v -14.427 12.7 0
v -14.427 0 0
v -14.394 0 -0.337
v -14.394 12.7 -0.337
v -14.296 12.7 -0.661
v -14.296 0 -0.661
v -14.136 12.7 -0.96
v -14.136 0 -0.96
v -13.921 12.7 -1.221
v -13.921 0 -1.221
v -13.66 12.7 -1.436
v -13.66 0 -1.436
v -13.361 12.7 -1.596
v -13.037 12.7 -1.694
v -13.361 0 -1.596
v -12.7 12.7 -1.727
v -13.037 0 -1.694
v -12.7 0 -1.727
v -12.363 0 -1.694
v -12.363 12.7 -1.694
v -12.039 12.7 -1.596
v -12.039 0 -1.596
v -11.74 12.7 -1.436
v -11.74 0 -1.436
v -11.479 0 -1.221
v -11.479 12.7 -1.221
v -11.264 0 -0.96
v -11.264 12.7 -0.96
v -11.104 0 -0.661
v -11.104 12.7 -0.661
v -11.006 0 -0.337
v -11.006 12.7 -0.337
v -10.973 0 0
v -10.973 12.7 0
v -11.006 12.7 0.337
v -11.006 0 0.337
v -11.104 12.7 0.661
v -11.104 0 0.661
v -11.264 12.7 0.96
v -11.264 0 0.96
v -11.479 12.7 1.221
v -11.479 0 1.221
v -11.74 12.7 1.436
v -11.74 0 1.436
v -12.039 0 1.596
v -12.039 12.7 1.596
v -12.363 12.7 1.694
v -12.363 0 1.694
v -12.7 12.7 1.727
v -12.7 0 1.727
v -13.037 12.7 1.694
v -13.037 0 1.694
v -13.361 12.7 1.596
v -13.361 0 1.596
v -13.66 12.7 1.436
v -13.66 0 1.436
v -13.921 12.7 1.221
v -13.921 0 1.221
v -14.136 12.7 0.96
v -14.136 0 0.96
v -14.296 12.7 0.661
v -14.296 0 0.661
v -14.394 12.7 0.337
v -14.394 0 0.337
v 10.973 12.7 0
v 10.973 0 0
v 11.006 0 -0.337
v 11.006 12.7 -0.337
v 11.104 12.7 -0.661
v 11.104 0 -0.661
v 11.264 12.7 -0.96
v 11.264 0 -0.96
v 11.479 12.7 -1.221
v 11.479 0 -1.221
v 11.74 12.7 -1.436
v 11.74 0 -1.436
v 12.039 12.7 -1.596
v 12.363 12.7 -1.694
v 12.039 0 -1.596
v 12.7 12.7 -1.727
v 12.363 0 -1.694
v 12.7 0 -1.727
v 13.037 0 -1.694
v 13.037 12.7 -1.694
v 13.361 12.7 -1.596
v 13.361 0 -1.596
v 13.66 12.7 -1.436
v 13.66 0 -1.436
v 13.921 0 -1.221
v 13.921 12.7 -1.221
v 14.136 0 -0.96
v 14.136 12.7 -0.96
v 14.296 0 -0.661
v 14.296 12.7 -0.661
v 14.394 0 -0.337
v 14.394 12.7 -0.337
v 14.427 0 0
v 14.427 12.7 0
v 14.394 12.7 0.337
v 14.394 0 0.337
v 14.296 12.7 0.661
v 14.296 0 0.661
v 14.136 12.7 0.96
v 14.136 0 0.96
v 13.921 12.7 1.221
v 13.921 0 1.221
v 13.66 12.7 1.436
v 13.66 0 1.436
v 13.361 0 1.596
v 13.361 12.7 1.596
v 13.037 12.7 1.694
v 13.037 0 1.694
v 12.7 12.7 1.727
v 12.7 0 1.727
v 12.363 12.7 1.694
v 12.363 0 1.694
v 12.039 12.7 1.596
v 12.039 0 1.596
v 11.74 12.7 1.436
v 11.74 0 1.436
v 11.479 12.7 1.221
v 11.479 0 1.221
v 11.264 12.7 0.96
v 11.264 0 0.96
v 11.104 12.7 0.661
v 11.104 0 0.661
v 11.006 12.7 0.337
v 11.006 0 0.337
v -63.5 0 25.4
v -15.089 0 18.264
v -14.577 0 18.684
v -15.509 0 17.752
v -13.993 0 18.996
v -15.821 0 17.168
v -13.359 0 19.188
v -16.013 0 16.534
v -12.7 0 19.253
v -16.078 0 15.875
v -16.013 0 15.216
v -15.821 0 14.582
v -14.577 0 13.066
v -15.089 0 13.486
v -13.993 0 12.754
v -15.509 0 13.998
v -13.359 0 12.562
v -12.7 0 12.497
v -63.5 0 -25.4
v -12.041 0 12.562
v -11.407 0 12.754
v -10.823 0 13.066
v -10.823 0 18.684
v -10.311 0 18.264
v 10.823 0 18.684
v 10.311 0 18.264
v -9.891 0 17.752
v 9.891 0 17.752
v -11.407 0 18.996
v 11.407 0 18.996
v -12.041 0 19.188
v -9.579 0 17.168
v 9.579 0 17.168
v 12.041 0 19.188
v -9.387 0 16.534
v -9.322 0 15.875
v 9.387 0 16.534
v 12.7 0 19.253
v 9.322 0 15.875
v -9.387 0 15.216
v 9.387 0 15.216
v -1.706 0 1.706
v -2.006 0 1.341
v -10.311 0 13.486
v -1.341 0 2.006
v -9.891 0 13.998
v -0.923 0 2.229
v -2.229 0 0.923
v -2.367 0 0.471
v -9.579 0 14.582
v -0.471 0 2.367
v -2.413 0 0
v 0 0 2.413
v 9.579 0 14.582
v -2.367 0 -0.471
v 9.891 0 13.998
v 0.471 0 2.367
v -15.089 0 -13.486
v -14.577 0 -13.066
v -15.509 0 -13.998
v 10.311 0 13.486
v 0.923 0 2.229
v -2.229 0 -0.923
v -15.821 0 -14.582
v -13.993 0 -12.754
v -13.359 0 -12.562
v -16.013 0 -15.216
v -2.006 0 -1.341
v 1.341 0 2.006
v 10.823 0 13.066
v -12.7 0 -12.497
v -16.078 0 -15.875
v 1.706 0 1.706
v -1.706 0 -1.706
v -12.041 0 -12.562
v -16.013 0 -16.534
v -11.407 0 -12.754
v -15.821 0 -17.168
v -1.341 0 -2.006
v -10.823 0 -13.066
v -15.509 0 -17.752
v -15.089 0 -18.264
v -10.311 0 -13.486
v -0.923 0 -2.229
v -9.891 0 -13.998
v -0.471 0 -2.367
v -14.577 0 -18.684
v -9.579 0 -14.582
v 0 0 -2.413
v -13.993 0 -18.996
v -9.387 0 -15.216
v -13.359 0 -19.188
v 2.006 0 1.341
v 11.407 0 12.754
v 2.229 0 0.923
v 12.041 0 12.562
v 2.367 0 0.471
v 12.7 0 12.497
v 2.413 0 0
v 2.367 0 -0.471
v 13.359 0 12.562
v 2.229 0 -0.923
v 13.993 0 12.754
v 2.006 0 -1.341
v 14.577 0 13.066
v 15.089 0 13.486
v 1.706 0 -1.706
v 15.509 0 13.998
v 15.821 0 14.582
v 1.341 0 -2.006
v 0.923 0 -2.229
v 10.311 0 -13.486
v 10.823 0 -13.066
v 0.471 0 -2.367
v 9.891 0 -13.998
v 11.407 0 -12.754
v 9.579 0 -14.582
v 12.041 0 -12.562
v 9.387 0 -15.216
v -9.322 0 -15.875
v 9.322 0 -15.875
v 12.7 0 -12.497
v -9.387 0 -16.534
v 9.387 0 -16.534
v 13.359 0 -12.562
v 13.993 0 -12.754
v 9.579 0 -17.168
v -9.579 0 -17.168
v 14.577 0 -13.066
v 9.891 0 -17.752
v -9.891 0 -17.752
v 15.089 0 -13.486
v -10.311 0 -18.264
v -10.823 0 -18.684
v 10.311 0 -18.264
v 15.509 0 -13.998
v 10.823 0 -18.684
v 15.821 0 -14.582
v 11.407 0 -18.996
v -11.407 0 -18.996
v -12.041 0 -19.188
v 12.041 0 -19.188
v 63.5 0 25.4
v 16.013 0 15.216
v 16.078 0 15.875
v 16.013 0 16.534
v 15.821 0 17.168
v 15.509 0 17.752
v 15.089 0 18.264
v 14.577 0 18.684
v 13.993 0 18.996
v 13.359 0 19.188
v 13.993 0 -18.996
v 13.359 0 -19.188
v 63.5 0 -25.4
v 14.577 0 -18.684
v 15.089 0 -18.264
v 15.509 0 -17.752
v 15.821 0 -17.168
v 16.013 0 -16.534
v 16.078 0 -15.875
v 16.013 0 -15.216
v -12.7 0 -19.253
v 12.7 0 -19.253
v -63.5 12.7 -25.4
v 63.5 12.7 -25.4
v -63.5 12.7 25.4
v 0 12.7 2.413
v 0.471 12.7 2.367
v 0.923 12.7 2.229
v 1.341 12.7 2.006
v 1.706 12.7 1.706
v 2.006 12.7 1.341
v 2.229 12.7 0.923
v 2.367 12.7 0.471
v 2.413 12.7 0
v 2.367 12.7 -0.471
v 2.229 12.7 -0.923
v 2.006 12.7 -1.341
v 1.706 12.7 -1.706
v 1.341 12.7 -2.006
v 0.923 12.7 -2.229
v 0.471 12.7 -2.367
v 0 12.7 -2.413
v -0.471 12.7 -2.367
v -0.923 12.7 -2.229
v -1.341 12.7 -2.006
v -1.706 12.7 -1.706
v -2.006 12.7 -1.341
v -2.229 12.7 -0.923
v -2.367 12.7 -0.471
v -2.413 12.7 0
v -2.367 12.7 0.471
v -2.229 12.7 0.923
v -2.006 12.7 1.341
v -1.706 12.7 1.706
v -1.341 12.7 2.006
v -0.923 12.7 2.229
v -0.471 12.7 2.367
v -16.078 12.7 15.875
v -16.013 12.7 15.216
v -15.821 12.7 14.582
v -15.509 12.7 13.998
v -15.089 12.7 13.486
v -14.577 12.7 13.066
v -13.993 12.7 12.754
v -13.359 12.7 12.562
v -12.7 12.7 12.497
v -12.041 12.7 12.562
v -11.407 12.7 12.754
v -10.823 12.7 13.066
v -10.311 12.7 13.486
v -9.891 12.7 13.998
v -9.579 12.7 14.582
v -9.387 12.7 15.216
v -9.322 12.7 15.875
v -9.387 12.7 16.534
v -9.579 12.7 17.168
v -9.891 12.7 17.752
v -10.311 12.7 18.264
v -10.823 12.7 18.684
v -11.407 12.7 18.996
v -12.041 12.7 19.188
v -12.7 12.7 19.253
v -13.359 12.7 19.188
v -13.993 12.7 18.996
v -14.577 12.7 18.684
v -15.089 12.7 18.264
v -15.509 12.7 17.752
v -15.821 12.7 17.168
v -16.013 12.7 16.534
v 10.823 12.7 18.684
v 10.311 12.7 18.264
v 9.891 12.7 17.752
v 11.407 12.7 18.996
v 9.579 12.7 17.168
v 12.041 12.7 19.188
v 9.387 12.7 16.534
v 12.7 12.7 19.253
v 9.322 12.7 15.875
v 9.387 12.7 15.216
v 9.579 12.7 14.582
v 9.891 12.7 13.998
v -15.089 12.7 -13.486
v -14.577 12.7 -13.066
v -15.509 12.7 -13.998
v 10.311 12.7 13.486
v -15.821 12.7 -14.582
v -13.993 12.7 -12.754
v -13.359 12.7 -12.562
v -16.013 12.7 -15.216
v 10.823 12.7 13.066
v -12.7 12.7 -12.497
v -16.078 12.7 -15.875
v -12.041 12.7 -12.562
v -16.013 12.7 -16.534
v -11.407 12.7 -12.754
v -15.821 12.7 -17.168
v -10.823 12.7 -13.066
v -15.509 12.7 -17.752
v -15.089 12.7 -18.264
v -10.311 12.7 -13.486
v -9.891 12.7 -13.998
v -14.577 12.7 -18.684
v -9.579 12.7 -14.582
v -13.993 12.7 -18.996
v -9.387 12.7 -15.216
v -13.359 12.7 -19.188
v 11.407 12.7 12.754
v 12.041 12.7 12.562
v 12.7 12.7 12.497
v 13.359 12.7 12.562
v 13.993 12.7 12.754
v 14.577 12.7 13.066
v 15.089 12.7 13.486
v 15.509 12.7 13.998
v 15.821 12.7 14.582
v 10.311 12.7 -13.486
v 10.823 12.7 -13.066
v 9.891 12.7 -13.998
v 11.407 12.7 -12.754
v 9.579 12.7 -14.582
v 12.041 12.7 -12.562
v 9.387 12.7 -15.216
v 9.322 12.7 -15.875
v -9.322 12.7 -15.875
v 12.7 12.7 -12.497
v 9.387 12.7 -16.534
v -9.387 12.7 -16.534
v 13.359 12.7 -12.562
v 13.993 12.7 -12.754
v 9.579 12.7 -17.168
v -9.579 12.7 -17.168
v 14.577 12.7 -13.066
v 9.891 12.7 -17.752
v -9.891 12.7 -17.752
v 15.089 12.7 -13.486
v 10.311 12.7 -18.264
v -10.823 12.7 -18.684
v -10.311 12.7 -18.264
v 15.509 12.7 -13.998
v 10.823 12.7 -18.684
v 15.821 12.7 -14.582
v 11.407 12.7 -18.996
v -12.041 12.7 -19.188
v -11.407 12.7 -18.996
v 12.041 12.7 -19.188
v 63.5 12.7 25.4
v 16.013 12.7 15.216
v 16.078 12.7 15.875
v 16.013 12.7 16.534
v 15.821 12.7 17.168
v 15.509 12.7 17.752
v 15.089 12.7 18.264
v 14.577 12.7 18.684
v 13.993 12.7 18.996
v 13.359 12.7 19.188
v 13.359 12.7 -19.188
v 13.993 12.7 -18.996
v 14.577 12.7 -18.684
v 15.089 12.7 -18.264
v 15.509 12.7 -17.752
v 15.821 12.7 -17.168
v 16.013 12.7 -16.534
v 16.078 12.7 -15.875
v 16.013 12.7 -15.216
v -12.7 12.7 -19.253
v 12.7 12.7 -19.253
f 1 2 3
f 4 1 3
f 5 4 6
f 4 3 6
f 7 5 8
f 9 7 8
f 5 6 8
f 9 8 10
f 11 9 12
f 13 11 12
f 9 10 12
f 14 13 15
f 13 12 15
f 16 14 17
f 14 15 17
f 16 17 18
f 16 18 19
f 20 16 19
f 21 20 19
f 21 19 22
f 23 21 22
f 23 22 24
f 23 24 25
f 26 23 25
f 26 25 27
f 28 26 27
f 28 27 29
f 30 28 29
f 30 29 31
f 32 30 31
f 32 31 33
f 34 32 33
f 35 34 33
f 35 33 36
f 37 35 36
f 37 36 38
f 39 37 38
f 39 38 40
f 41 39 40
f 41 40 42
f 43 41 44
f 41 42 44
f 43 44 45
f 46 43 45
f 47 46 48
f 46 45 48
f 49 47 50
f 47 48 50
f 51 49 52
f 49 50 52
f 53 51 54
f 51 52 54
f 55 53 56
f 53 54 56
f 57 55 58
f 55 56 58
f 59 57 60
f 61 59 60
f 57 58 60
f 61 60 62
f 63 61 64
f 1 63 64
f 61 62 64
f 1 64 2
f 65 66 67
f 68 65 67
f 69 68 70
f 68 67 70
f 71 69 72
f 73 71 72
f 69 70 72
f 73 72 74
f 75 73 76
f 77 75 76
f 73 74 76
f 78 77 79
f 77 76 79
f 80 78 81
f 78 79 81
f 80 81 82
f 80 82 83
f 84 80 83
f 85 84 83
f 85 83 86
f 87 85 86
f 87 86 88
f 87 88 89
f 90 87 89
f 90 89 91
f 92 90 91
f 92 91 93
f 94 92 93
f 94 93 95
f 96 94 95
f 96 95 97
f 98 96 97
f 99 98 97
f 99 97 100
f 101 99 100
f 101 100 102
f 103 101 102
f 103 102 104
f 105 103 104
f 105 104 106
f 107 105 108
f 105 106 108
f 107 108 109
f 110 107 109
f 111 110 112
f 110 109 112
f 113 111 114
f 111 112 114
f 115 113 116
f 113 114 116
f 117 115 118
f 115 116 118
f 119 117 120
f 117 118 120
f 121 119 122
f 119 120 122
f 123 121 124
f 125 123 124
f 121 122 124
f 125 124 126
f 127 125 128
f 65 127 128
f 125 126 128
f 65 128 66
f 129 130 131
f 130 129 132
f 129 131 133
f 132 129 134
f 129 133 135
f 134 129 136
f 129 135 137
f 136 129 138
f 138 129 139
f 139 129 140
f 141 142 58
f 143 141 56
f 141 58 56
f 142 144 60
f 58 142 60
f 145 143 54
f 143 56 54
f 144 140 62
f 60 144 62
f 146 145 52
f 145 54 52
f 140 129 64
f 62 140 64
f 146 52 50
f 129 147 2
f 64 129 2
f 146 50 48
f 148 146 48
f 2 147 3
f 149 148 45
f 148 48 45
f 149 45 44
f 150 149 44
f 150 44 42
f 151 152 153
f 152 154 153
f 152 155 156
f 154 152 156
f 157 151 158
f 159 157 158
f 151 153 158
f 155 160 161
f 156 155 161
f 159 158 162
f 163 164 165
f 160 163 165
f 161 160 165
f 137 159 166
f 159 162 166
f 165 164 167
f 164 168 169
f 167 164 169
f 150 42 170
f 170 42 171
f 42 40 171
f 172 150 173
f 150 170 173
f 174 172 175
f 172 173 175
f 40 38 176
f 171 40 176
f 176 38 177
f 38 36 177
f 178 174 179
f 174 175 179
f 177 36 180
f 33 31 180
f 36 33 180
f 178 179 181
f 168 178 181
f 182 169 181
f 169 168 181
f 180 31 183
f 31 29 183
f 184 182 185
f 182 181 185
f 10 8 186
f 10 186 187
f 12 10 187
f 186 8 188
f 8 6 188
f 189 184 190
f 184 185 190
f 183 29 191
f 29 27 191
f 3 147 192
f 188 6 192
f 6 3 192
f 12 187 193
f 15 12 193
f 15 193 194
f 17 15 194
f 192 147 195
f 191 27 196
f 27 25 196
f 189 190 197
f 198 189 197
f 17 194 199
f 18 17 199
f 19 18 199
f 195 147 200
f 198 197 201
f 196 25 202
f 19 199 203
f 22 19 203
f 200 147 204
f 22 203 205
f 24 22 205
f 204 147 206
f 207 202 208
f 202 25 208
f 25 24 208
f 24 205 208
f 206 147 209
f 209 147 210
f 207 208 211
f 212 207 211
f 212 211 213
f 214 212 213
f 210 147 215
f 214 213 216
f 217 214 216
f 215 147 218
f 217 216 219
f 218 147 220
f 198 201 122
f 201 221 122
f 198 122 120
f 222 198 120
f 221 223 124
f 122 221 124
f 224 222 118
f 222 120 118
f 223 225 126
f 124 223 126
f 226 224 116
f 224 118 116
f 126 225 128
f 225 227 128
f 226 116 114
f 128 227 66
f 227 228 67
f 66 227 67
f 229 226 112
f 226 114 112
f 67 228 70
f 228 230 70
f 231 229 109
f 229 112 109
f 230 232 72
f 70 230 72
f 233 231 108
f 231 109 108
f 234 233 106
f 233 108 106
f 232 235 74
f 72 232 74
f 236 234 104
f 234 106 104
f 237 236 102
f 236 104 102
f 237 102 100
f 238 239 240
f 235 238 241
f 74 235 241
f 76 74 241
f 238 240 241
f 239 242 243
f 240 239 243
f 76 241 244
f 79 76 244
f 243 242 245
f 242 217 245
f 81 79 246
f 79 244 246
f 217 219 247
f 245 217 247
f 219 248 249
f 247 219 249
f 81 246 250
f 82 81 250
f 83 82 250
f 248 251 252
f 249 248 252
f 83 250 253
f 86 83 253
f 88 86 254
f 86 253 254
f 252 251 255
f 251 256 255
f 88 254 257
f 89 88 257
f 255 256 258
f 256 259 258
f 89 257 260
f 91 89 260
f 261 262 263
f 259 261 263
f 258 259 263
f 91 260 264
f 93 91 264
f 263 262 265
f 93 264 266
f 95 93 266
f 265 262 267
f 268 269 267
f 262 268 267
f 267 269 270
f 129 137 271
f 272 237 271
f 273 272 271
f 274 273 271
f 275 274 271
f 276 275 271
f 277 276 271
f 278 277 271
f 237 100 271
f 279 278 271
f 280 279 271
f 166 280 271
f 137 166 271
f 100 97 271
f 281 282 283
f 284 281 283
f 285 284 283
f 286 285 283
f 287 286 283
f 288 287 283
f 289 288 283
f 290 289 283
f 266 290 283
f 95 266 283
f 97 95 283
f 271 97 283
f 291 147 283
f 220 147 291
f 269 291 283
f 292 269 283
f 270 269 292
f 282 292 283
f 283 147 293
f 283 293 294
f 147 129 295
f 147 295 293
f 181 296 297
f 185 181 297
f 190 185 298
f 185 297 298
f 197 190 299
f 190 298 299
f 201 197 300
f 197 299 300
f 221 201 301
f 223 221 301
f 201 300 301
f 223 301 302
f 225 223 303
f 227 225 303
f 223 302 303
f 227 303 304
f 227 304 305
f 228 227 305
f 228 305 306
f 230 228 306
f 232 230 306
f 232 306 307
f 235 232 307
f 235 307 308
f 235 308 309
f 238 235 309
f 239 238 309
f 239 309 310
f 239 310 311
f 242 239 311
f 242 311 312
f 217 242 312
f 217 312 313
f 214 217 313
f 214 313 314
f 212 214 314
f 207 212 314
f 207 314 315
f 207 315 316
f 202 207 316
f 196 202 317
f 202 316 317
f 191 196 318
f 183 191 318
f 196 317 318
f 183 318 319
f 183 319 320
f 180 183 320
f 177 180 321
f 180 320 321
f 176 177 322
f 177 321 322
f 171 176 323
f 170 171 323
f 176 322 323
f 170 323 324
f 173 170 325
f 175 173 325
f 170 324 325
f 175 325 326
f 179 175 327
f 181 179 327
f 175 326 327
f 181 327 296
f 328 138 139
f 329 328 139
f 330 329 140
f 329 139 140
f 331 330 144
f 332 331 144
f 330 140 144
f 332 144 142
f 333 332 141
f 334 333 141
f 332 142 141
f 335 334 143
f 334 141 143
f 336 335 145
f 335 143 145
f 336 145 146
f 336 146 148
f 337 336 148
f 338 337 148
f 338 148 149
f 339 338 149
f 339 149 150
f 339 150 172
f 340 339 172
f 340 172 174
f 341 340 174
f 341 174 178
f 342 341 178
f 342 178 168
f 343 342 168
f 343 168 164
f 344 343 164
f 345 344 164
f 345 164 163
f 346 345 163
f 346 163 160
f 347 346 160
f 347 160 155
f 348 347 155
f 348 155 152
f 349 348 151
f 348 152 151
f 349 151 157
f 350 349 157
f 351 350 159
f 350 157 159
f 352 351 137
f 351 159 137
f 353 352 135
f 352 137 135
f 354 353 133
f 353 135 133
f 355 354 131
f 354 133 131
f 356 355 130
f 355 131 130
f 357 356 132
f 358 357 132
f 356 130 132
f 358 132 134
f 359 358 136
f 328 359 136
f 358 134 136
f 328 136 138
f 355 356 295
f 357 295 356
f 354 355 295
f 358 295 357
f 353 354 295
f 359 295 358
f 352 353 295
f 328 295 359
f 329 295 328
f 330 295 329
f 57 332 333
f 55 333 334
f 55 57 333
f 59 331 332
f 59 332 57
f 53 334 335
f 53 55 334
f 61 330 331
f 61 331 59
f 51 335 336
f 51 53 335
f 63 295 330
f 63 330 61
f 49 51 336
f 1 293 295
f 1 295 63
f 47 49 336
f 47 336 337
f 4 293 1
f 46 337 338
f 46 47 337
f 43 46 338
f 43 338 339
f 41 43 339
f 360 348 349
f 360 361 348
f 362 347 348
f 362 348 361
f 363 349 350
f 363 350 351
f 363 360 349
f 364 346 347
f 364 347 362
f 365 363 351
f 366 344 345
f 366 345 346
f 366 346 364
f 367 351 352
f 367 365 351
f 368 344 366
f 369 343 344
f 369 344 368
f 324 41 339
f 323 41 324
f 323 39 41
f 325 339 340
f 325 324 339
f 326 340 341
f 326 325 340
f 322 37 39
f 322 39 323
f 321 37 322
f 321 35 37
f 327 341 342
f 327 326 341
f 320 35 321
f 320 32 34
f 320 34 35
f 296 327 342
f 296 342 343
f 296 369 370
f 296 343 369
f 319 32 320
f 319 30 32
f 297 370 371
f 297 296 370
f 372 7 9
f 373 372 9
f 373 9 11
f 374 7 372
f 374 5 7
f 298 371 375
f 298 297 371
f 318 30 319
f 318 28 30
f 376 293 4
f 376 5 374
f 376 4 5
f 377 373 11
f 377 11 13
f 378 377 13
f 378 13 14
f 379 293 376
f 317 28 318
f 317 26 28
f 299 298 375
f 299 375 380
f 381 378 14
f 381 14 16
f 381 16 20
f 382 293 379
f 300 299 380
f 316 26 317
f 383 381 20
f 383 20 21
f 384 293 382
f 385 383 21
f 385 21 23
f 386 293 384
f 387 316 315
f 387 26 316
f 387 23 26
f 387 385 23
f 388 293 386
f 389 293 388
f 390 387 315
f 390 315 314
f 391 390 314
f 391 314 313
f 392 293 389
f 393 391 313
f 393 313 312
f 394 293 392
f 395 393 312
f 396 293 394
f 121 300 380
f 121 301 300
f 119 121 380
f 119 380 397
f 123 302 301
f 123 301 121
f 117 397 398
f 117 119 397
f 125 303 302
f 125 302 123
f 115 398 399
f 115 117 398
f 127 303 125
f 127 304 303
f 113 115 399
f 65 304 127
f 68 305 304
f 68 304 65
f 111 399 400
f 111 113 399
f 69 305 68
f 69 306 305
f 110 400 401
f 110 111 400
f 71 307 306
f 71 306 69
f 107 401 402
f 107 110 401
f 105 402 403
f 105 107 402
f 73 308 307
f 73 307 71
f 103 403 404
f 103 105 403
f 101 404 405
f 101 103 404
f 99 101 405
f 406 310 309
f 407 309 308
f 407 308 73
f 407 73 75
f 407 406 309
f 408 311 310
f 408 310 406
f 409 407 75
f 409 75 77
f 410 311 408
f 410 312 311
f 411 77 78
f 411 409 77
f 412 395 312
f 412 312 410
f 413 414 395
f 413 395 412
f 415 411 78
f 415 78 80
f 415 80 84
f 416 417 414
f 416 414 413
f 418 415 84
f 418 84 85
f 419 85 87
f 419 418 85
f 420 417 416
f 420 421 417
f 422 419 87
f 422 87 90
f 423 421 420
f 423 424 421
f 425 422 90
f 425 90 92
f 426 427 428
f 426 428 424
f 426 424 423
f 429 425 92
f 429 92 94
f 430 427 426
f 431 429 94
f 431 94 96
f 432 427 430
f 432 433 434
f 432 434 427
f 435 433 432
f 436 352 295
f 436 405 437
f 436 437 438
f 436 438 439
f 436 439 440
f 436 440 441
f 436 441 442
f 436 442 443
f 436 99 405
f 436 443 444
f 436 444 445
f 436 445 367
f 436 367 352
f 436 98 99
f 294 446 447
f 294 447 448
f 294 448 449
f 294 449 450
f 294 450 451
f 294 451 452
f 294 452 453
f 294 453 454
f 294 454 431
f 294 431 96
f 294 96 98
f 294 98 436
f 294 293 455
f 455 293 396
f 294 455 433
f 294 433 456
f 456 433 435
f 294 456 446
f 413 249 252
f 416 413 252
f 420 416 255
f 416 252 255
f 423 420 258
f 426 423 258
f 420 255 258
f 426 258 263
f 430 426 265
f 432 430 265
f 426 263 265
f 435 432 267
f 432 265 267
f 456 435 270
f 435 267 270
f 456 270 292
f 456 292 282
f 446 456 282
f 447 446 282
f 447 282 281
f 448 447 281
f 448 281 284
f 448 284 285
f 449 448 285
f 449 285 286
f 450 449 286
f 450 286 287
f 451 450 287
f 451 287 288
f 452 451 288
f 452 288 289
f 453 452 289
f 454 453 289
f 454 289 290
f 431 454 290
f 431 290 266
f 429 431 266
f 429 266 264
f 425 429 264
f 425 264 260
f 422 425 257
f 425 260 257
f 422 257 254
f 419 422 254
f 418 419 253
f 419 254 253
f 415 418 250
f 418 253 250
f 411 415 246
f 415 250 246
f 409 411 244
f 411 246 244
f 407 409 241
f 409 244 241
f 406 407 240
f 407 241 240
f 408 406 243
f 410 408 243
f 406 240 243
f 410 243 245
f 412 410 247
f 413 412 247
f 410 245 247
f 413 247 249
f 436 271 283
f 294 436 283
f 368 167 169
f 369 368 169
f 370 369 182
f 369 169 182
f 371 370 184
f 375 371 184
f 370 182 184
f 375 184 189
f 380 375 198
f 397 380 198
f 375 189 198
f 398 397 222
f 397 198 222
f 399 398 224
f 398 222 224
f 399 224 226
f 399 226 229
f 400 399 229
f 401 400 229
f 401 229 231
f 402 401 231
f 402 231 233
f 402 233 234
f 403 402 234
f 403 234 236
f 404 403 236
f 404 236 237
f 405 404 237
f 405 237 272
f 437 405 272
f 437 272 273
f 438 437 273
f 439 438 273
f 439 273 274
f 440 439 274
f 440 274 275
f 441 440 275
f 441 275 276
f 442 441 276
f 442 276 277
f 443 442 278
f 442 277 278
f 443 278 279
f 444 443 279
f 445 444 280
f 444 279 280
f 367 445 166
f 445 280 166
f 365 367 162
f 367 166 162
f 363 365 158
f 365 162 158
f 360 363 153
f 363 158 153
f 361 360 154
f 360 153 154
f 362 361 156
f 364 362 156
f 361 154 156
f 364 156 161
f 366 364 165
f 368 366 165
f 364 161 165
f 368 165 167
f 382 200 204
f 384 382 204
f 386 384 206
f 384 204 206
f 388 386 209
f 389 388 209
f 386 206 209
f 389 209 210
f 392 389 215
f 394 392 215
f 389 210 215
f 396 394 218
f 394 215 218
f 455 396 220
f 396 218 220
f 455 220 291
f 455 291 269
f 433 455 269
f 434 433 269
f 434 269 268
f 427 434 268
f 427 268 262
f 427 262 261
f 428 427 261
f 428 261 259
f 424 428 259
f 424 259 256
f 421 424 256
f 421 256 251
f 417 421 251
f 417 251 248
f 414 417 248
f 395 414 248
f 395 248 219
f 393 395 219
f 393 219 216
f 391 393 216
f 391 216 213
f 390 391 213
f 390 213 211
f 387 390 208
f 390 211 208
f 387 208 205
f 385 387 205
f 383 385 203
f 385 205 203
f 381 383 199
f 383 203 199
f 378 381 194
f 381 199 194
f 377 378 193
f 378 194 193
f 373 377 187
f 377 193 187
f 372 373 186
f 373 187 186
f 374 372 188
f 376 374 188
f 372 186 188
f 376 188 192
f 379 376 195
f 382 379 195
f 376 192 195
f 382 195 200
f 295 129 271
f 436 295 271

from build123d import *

# Parameters (mm, degrees)
SKETCH1_W                 = 127
SKETCH1_H                 = 50.8
BOSS_EXTRUDE1_DEPTH       = 12.7
SKETCH2_R                 = 2.413
CUT_EXTRUDE1_DEPTH        = 70.560764803
F_1_4_CLEARANCE_HOLE1_D   = 6.7564
TAP_DRILL_FOR_8_32_TAP1_D = 3.4544


with BuildPart() as part:
    # Sketch1 → Boss-Extrude1 (new body)
    with BuildSketch(Plane(origin=(0, 0, 0), x_dir=(1, 0, 0), z_dir=(0, 1, 0))):
        Rectangle(SKETCH1_W, SKETCH1_H)
    extrude(amount=BOSS_EXTRUDE1_DEPTH)

    # Sketch2 → Cut-Extrude1 (cut, through all)
    with BuildSketch(Plane(origin=(0, 12.7, 0), x_dir=(1, 0, 0), z_dir=(0, 1, 0))):
        with Locations(Location((0, 0, 0), (0, 0, 270))):
            Circle(SKETCH2_R)
    extrude(amount=-CUT_EXTRUDE1_DEPTH, mode=Mode.SUBTRACT)

    # 1/4 Clearance Hole1 (through all)
    with Locations(Plane(origin=(0, 12.7, 0), x_dir=(1, 0, 0), z_dir=(0, 1, 0))):
        with Locations((-12.7, 15.875), (12.7, 15.875), (-12.7, -15.875), (12.7, -15.875)):
            Hole(F_1_4_CLEARANCE_HOLE1_D / 2)

    # Tap Drill for #8-32 Tap1 (through all)
    with Locations(Plane(origin=(0, 12.7, 0), x_dir=(1, 0, 0), z_dir=(0, 1, 0))):
        with Locations((12.7, 0), (-12.7, 0)):
            Hole(TAP_DRILL_FOR_8_32_TAP1_D / 2)


solid = part.part
